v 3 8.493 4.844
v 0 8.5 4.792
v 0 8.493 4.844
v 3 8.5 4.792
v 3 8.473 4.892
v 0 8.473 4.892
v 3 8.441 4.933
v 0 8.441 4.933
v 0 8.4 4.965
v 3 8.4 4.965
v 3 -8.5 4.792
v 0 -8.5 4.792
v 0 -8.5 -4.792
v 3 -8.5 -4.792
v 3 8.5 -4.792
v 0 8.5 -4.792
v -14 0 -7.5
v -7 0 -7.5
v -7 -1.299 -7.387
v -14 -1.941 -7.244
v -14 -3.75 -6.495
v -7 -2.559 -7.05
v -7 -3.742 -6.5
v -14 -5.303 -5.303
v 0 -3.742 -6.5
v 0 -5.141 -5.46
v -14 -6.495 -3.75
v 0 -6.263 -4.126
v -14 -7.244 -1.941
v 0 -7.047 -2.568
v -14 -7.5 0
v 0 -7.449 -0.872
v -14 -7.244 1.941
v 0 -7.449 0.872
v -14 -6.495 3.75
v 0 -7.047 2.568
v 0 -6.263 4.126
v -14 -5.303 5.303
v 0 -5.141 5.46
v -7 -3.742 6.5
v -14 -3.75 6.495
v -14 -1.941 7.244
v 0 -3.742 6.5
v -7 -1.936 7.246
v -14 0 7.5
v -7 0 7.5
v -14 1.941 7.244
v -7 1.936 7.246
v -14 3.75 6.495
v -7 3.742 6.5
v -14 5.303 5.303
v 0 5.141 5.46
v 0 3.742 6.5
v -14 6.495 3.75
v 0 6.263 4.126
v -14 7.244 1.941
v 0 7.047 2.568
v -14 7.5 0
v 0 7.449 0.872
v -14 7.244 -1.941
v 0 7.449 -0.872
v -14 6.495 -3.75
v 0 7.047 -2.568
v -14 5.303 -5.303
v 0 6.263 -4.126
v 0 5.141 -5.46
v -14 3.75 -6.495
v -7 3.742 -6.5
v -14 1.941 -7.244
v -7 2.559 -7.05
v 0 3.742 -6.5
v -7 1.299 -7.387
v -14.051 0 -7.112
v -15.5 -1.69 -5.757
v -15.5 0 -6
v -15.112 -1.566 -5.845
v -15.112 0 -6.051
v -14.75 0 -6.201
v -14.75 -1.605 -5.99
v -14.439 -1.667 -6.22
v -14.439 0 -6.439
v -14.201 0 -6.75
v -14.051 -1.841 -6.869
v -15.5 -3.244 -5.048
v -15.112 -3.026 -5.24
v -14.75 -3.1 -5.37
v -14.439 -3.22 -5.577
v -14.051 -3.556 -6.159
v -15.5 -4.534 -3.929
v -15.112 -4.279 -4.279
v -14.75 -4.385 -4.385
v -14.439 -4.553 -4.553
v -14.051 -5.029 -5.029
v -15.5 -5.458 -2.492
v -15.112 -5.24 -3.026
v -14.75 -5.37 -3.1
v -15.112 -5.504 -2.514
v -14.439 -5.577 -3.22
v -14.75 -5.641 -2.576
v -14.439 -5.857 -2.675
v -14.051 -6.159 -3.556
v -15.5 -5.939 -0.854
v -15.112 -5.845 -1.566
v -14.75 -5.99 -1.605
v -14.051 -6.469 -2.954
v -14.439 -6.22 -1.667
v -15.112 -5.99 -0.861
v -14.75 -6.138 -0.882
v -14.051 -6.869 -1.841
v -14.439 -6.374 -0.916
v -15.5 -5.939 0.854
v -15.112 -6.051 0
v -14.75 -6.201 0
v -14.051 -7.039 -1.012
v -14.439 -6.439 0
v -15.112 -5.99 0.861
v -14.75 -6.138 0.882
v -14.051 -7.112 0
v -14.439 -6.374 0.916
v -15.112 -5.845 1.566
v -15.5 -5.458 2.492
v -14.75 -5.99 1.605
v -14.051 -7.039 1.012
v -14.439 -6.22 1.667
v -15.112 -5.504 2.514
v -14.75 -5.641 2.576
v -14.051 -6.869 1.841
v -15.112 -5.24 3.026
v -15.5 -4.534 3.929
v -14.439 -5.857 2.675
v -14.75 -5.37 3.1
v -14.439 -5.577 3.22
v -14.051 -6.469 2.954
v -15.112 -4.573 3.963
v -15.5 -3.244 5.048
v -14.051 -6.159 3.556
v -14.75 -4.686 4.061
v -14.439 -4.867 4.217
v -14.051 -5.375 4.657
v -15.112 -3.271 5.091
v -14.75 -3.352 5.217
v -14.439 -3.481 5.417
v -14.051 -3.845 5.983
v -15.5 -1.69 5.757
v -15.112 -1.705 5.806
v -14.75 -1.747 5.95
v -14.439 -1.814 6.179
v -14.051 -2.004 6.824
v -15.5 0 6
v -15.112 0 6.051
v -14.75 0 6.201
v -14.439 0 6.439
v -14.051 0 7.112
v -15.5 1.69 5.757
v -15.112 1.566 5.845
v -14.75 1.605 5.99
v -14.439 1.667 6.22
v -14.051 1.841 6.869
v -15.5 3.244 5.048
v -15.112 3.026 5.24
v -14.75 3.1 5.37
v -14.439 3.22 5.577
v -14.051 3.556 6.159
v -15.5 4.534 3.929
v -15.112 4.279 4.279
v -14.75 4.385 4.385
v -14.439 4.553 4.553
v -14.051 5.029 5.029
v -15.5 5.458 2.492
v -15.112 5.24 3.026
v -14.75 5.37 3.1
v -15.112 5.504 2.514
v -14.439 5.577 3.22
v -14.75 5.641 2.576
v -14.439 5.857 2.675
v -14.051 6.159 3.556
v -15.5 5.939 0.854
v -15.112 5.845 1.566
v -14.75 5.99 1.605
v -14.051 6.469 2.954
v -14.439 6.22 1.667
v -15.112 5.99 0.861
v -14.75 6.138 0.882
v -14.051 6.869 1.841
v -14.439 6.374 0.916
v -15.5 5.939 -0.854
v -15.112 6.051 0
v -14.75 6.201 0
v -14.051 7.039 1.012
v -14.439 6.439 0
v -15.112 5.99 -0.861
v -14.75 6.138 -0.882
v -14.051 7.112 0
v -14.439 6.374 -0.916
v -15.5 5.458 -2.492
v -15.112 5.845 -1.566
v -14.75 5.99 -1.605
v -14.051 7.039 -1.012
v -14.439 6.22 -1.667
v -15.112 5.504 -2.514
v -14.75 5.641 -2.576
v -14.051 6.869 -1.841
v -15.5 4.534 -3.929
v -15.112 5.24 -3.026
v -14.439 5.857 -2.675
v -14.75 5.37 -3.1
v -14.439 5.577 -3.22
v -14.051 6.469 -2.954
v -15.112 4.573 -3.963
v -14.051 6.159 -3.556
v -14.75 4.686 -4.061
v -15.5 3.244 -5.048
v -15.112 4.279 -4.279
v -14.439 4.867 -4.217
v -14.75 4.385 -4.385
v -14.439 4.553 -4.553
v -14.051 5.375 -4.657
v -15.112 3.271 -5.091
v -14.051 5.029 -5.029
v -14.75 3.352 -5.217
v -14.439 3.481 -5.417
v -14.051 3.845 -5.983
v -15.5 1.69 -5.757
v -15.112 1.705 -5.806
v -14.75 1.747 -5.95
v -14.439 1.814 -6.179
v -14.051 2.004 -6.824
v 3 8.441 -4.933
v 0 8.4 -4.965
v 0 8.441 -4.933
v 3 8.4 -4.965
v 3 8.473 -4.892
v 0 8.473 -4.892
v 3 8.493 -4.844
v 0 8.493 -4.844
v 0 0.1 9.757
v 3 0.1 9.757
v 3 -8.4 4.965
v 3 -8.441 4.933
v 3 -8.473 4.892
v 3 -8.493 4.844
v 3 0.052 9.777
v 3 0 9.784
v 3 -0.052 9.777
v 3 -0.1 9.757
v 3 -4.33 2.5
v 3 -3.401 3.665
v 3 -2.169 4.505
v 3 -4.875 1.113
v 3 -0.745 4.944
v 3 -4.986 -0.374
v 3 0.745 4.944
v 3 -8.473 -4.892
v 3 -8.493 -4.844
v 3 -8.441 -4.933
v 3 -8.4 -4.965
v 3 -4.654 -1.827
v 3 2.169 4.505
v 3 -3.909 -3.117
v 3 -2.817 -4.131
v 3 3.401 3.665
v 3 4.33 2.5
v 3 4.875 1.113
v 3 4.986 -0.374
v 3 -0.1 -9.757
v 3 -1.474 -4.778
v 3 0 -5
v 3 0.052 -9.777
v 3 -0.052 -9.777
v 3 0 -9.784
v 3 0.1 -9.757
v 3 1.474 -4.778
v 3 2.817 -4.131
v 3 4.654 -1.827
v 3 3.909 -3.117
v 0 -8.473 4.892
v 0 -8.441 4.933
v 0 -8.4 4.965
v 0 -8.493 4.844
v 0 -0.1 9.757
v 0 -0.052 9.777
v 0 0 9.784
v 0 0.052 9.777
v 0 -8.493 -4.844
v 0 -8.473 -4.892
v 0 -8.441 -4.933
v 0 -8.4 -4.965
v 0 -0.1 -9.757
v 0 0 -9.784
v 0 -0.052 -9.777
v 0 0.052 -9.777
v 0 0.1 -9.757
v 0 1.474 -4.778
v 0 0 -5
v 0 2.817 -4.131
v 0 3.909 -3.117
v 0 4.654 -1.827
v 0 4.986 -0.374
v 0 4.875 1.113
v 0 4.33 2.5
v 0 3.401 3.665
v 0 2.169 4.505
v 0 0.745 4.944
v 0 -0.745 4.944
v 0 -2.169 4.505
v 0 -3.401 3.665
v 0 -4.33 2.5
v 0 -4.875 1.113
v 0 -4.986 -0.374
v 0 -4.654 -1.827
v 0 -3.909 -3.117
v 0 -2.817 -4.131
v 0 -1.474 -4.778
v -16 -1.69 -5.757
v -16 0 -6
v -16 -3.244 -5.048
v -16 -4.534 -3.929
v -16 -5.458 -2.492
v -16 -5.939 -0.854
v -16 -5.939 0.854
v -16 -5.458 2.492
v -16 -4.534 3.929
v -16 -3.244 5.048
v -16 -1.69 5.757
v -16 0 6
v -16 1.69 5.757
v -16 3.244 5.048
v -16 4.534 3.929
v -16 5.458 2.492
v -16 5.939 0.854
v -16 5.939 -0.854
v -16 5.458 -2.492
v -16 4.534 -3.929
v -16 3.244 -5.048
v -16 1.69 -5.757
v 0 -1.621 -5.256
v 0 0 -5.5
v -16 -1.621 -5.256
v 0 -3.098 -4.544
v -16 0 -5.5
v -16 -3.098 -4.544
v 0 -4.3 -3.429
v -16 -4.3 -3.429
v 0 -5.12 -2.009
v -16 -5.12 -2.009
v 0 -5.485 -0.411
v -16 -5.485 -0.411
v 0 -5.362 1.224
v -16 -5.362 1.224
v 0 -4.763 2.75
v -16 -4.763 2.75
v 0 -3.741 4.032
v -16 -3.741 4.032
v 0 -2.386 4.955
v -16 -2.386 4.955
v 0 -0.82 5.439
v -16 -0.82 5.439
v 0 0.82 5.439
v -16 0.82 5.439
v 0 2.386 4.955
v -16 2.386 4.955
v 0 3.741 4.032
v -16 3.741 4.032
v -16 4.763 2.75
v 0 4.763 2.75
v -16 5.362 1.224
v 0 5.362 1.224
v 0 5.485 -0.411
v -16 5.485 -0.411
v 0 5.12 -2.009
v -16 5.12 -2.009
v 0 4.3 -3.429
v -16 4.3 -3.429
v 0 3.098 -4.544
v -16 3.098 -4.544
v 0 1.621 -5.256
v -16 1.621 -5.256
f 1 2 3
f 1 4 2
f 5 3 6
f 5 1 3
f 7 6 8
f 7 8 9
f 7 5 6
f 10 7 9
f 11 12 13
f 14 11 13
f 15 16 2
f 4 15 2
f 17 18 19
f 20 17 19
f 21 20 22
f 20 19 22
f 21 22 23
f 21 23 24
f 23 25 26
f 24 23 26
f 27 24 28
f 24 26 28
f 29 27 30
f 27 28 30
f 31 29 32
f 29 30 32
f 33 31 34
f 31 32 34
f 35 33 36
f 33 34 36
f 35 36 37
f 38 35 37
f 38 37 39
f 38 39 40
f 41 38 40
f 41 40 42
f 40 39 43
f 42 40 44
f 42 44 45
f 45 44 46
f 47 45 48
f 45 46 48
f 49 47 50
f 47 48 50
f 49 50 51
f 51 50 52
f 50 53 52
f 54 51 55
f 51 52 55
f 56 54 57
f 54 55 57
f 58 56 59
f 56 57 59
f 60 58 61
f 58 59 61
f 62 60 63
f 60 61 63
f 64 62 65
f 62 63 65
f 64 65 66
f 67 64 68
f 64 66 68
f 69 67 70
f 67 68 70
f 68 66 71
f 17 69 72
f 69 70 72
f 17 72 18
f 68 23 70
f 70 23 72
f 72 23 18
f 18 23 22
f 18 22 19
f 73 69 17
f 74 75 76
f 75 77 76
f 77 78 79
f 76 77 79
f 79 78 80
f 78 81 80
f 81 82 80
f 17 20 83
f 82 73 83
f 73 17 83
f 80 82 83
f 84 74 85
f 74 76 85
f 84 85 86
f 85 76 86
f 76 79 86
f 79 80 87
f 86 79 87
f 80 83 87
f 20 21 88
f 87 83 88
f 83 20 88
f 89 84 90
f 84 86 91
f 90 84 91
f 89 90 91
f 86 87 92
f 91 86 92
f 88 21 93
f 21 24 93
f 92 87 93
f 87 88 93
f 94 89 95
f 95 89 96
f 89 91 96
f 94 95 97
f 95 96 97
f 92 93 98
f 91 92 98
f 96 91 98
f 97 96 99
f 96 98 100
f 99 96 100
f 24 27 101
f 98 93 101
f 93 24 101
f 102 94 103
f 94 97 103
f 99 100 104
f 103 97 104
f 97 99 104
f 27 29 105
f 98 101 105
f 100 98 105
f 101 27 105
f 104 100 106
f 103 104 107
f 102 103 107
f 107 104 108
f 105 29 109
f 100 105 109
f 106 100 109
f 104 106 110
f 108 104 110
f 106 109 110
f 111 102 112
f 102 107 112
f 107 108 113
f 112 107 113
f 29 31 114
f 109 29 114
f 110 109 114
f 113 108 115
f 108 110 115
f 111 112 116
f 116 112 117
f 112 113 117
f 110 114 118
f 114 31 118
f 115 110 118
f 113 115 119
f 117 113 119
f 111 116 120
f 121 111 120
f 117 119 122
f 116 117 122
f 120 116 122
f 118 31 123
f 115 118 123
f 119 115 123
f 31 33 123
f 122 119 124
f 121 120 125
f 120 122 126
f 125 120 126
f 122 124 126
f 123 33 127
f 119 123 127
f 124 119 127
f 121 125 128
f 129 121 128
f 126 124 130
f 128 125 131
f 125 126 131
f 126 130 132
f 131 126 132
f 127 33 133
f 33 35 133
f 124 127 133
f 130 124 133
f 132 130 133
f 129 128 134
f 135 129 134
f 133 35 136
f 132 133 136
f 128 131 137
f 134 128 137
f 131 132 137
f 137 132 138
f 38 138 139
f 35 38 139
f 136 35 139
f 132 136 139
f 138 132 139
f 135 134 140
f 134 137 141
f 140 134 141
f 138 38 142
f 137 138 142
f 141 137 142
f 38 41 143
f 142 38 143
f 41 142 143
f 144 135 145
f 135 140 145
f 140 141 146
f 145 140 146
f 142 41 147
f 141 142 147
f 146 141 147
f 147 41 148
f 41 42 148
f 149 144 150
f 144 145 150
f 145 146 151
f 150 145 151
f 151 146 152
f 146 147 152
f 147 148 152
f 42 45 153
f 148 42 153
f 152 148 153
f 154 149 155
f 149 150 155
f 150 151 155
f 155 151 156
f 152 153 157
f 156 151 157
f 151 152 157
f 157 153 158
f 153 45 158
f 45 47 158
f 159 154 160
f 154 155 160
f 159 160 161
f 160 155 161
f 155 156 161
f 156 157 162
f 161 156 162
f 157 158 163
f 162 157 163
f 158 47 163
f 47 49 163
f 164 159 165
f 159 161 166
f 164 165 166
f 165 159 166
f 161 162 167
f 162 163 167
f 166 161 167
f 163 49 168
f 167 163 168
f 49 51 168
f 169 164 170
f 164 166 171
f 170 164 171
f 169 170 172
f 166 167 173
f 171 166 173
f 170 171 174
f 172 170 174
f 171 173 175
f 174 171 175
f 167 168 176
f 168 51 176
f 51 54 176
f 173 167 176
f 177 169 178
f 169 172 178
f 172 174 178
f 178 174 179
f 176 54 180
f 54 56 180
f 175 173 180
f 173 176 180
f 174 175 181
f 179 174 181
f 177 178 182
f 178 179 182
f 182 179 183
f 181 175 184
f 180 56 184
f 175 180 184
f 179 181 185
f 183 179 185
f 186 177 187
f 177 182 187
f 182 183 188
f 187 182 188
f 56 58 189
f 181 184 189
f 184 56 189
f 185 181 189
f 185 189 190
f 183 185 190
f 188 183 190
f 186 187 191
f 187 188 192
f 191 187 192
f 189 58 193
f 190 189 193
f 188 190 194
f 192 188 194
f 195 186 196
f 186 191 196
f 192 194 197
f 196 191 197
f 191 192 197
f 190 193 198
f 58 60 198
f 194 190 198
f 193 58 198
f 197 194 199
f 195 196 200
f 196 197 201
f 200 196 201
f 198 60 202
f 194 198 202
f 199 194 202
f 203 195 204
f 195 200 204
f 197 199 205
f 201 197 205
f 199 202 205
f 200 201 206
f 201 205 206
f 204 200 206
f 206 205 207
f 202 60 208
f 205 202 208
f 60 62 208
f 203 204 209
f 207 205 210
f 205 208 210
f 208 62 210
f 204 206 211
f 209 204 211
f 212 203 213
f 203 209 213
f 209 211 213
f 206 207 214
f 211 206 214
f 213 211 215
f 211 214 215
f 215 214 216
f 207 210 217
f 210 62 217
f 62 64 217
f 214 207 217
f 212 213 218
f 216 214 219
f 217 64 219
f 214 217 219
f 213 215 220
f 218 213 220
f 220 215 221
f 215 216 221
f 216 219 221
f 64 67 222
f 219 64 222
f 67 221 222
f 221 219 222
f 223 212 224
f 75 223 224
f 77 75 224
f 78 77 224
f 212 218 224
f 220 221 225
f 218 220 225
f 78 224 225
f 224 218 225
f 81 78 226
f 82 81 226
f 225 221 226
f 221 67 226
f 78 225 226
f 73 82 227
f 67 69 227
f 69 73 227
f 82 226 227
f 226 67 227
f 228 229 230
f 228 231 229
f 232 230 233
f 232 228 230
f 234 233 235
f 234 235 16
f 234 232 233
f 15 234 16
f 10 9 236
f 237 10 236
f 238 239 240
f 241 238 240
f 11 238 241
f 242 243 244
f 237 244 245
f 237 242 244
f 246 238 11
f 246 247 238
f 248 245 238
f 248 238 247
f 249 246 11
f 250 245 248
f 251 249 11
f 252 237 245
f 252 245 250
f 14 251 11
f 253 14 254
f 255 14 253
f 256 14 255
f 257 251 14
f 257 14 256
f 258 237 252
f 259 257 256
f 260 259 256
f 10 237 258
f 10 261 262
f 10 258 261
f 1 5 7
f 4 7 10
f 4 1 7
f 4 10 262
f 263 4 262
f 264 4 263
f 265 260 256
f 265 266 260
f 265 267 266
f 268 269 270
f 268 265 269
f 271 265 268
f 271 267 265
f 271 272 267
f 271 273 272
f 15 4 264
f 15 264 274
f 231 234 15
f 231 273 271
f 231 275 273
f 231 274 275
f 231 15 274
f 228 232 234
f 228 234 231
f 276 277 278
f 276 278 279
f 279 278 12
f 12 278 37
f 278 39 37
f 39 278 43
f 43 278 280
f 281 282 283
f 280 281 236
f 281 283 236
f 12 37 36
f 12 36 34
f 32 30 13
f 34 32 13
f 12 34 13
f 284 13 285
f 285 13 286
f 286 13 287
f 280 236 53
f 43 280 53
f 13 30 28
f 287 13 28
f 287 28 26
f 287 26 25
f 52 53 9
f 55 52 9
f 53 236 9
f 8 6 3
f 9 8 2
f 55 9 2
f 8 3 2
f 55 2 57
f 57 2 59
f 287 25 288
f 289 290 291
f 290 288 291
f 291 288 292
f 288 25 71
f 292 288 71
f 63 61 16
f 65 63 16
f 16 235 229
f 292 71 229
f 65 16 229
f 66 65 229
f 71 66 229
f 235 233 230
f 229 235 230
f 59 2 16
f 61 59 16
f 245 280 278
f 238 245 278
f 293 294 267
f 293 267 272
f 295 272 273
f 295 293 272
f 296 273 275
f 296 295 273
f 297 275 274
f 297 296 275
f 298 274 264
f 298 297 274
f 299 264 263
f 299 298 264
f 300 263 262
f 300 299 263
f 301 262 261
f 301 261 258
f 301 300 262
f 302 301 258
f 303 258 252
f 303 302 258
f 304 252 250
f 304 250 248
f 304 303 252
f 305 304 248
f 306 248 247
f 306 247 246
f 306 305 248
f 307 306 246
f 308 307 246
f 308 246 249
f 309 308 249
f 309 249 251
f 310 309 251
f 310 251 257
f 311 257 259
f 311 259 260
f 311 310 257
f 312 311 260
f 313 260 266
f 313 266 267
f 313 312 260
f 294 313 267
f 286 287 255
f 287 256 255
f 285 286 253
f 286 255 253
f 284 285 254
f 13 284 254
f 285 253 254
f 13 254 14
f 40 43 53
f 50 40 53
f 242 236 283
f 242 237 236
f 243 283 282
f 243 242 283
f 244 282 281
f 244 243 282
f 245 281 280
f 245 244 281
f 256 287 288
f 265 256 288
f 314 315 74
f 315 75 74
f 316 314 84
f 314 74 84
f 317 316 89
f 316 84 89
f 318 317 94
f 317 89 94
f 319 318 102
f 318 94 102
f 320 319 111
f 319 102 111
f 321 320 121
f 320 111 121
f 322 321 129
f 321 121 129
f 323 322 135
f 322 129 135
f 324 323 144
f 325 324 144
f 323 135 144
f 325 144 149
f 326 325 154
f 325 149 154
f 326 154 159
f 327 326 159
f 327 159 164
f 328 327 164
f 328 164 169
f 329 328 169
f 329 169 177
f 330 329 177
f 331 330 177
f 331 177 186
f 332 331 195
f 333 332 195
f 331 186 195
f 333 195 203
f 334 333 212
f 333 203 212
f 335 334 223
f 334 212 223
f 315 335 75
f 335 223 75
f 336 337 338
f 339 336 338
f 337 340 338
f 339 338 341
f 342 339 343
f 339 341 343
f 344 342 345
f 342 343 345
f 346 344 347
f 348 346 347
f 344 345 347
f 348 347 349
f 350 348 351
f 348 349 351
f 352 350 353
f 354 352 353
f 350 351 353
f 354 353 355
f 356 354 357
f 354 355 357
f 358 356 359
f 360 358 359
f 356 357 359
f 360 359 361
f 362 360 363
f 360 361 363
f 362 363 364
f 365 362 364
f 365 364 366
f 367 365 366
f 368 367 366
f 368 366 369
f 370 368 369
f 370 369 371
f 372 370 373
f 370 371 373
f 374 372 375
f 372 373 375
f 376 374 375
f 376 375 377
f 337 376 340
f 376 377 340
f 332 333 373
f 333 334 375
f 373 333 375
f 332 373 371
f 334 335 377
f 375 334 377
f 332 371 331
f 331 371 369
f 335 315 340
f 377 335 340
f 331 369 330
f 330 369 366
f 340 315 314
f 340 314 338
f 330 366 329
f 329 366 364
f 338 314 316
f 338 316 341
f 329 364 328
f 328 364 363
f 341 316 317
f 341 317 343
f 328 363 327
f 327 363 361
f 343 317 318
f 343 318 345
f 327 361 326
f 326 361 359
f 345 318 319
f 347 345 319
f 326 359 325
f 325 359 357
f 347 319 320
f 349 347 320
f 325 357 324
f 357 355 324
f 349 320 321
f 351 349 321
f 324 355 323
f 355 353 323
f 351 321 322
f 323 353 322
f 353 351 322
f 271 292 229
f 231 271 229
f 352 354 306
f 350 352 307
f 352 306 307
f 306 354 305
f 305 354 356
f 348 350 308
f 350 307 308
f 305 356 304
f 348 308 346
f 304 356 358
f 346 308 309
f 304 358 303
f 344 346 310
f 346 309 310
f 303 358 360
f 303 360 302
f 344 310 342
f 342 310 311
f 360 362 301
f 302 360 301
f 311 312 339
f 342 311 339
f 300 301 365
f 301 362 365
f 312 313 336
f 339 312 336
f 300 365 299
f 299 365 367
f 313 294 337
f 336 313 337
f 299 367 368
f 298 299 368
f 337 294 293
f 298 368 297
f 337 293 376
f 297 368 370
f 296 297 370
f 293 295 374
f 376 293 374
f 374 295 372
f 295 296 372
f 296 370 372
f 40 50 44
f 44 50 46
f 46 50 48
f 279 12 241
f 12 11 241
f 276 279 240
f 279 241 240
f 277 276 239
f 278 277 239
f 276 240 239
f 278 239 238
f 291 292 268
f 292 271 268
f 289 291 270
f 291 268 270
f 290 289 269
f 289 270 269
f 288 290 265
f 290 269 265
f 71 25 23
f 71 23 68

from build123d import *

# Parameters (mm, degrees)
SKETCH2_OUTSIDE_W   = 22.314
SKETCH2_OUTSIDE_H   = 22.314
SKETCH2_OUTSIDE_W_2 = 13
SKETCH2_OUTSIDE_H_2 = 17
CUT_EXTRUDE1_DEPTH  = 7
SKETCH3_R           = 5
BOSS_EXTRUDE1_DEPTH = 3
FILLET1_R           = 0.2


with BuildPart() as part:
    # Sketch1 → Revolve1 (revolve)
    with BuildSketch(Plane.XY, mode=Mode.PRIVATE) as revolve1_sk:
        with BuildLine():
            Line((0, 5.5), (-16, 5.5))
            Line((-16, 5.5), (-16, 6))
            Line((-16, 6), (-15.5, 6))
            ThreePointArc((-15.5, 6), (-14.439339828, 6.439339828), (-14, 7.5))
            Line((-14, 7.5), (0, 7.5))
            Line((0, 7.5), (0, 5.5))
        make_face()
    revolve(revolve1_sk.sketch.rotate(Axis((0, 0, 0), (-1, 0, 0)), 90), axis=Axis((0, 0, 0), (-1, 0, 0)))

    # Sketch2 outside → Cut-Extrude1 (cut)
    with BuildSketch(Plane(origin=(0, 0, 0), x_dir=(0, 0, -1), z_dir=(1, 0, 0))):
        Rectangle(SKETCH2_OUTSIDE_W, SKETCH2_OUTSIDE_H)
        Rectangle(SKETCH2_OUTSIDE_W_2, SKETCH2_OUTSIDE_H_2, mode=Mode.SUBTRACT)
    extrude(amount=-CUT_EXTRUDE1_DEPTH, mode=Mode.SUBTRACT)

    # Sketch3 → Boss-Extrude1 (add)
    with BuildSketch(Plane(origin=(0, 0, 0), x_dir=(0, 0, -1), z_dir=(1, 0, 0))):
        Polygon((9.814954576, 0), (4.907477288, 8.5), (-4.907477288, 8.5), (-9.814954576, 0), (-4.907477288, -8.5), (4.907477288, -8.5), align=None)
        Circle(SKETCH3_R, mode=Mode.SUBTRACT)
    extrude(amount=BOSS_EXTRUDE1_DEPTH)

    # Fillet1
    fillet1_edges = [part.edges().sort_by_distance(p)[0] for p in [
        (1.5, -8.5, -4.907477288),
        (1.5, 0, -9.814954576),
        (1.5, 8.5, -4.907477288),
        (1.5, 8.5, 4.907477288),
        (1.5, 0, 9.814954576),
        (1.5, -8.5, 4.907477288),
    ]]
    fillet(fillet1_edges, radius=FILLET1_R)


solid = part.part
